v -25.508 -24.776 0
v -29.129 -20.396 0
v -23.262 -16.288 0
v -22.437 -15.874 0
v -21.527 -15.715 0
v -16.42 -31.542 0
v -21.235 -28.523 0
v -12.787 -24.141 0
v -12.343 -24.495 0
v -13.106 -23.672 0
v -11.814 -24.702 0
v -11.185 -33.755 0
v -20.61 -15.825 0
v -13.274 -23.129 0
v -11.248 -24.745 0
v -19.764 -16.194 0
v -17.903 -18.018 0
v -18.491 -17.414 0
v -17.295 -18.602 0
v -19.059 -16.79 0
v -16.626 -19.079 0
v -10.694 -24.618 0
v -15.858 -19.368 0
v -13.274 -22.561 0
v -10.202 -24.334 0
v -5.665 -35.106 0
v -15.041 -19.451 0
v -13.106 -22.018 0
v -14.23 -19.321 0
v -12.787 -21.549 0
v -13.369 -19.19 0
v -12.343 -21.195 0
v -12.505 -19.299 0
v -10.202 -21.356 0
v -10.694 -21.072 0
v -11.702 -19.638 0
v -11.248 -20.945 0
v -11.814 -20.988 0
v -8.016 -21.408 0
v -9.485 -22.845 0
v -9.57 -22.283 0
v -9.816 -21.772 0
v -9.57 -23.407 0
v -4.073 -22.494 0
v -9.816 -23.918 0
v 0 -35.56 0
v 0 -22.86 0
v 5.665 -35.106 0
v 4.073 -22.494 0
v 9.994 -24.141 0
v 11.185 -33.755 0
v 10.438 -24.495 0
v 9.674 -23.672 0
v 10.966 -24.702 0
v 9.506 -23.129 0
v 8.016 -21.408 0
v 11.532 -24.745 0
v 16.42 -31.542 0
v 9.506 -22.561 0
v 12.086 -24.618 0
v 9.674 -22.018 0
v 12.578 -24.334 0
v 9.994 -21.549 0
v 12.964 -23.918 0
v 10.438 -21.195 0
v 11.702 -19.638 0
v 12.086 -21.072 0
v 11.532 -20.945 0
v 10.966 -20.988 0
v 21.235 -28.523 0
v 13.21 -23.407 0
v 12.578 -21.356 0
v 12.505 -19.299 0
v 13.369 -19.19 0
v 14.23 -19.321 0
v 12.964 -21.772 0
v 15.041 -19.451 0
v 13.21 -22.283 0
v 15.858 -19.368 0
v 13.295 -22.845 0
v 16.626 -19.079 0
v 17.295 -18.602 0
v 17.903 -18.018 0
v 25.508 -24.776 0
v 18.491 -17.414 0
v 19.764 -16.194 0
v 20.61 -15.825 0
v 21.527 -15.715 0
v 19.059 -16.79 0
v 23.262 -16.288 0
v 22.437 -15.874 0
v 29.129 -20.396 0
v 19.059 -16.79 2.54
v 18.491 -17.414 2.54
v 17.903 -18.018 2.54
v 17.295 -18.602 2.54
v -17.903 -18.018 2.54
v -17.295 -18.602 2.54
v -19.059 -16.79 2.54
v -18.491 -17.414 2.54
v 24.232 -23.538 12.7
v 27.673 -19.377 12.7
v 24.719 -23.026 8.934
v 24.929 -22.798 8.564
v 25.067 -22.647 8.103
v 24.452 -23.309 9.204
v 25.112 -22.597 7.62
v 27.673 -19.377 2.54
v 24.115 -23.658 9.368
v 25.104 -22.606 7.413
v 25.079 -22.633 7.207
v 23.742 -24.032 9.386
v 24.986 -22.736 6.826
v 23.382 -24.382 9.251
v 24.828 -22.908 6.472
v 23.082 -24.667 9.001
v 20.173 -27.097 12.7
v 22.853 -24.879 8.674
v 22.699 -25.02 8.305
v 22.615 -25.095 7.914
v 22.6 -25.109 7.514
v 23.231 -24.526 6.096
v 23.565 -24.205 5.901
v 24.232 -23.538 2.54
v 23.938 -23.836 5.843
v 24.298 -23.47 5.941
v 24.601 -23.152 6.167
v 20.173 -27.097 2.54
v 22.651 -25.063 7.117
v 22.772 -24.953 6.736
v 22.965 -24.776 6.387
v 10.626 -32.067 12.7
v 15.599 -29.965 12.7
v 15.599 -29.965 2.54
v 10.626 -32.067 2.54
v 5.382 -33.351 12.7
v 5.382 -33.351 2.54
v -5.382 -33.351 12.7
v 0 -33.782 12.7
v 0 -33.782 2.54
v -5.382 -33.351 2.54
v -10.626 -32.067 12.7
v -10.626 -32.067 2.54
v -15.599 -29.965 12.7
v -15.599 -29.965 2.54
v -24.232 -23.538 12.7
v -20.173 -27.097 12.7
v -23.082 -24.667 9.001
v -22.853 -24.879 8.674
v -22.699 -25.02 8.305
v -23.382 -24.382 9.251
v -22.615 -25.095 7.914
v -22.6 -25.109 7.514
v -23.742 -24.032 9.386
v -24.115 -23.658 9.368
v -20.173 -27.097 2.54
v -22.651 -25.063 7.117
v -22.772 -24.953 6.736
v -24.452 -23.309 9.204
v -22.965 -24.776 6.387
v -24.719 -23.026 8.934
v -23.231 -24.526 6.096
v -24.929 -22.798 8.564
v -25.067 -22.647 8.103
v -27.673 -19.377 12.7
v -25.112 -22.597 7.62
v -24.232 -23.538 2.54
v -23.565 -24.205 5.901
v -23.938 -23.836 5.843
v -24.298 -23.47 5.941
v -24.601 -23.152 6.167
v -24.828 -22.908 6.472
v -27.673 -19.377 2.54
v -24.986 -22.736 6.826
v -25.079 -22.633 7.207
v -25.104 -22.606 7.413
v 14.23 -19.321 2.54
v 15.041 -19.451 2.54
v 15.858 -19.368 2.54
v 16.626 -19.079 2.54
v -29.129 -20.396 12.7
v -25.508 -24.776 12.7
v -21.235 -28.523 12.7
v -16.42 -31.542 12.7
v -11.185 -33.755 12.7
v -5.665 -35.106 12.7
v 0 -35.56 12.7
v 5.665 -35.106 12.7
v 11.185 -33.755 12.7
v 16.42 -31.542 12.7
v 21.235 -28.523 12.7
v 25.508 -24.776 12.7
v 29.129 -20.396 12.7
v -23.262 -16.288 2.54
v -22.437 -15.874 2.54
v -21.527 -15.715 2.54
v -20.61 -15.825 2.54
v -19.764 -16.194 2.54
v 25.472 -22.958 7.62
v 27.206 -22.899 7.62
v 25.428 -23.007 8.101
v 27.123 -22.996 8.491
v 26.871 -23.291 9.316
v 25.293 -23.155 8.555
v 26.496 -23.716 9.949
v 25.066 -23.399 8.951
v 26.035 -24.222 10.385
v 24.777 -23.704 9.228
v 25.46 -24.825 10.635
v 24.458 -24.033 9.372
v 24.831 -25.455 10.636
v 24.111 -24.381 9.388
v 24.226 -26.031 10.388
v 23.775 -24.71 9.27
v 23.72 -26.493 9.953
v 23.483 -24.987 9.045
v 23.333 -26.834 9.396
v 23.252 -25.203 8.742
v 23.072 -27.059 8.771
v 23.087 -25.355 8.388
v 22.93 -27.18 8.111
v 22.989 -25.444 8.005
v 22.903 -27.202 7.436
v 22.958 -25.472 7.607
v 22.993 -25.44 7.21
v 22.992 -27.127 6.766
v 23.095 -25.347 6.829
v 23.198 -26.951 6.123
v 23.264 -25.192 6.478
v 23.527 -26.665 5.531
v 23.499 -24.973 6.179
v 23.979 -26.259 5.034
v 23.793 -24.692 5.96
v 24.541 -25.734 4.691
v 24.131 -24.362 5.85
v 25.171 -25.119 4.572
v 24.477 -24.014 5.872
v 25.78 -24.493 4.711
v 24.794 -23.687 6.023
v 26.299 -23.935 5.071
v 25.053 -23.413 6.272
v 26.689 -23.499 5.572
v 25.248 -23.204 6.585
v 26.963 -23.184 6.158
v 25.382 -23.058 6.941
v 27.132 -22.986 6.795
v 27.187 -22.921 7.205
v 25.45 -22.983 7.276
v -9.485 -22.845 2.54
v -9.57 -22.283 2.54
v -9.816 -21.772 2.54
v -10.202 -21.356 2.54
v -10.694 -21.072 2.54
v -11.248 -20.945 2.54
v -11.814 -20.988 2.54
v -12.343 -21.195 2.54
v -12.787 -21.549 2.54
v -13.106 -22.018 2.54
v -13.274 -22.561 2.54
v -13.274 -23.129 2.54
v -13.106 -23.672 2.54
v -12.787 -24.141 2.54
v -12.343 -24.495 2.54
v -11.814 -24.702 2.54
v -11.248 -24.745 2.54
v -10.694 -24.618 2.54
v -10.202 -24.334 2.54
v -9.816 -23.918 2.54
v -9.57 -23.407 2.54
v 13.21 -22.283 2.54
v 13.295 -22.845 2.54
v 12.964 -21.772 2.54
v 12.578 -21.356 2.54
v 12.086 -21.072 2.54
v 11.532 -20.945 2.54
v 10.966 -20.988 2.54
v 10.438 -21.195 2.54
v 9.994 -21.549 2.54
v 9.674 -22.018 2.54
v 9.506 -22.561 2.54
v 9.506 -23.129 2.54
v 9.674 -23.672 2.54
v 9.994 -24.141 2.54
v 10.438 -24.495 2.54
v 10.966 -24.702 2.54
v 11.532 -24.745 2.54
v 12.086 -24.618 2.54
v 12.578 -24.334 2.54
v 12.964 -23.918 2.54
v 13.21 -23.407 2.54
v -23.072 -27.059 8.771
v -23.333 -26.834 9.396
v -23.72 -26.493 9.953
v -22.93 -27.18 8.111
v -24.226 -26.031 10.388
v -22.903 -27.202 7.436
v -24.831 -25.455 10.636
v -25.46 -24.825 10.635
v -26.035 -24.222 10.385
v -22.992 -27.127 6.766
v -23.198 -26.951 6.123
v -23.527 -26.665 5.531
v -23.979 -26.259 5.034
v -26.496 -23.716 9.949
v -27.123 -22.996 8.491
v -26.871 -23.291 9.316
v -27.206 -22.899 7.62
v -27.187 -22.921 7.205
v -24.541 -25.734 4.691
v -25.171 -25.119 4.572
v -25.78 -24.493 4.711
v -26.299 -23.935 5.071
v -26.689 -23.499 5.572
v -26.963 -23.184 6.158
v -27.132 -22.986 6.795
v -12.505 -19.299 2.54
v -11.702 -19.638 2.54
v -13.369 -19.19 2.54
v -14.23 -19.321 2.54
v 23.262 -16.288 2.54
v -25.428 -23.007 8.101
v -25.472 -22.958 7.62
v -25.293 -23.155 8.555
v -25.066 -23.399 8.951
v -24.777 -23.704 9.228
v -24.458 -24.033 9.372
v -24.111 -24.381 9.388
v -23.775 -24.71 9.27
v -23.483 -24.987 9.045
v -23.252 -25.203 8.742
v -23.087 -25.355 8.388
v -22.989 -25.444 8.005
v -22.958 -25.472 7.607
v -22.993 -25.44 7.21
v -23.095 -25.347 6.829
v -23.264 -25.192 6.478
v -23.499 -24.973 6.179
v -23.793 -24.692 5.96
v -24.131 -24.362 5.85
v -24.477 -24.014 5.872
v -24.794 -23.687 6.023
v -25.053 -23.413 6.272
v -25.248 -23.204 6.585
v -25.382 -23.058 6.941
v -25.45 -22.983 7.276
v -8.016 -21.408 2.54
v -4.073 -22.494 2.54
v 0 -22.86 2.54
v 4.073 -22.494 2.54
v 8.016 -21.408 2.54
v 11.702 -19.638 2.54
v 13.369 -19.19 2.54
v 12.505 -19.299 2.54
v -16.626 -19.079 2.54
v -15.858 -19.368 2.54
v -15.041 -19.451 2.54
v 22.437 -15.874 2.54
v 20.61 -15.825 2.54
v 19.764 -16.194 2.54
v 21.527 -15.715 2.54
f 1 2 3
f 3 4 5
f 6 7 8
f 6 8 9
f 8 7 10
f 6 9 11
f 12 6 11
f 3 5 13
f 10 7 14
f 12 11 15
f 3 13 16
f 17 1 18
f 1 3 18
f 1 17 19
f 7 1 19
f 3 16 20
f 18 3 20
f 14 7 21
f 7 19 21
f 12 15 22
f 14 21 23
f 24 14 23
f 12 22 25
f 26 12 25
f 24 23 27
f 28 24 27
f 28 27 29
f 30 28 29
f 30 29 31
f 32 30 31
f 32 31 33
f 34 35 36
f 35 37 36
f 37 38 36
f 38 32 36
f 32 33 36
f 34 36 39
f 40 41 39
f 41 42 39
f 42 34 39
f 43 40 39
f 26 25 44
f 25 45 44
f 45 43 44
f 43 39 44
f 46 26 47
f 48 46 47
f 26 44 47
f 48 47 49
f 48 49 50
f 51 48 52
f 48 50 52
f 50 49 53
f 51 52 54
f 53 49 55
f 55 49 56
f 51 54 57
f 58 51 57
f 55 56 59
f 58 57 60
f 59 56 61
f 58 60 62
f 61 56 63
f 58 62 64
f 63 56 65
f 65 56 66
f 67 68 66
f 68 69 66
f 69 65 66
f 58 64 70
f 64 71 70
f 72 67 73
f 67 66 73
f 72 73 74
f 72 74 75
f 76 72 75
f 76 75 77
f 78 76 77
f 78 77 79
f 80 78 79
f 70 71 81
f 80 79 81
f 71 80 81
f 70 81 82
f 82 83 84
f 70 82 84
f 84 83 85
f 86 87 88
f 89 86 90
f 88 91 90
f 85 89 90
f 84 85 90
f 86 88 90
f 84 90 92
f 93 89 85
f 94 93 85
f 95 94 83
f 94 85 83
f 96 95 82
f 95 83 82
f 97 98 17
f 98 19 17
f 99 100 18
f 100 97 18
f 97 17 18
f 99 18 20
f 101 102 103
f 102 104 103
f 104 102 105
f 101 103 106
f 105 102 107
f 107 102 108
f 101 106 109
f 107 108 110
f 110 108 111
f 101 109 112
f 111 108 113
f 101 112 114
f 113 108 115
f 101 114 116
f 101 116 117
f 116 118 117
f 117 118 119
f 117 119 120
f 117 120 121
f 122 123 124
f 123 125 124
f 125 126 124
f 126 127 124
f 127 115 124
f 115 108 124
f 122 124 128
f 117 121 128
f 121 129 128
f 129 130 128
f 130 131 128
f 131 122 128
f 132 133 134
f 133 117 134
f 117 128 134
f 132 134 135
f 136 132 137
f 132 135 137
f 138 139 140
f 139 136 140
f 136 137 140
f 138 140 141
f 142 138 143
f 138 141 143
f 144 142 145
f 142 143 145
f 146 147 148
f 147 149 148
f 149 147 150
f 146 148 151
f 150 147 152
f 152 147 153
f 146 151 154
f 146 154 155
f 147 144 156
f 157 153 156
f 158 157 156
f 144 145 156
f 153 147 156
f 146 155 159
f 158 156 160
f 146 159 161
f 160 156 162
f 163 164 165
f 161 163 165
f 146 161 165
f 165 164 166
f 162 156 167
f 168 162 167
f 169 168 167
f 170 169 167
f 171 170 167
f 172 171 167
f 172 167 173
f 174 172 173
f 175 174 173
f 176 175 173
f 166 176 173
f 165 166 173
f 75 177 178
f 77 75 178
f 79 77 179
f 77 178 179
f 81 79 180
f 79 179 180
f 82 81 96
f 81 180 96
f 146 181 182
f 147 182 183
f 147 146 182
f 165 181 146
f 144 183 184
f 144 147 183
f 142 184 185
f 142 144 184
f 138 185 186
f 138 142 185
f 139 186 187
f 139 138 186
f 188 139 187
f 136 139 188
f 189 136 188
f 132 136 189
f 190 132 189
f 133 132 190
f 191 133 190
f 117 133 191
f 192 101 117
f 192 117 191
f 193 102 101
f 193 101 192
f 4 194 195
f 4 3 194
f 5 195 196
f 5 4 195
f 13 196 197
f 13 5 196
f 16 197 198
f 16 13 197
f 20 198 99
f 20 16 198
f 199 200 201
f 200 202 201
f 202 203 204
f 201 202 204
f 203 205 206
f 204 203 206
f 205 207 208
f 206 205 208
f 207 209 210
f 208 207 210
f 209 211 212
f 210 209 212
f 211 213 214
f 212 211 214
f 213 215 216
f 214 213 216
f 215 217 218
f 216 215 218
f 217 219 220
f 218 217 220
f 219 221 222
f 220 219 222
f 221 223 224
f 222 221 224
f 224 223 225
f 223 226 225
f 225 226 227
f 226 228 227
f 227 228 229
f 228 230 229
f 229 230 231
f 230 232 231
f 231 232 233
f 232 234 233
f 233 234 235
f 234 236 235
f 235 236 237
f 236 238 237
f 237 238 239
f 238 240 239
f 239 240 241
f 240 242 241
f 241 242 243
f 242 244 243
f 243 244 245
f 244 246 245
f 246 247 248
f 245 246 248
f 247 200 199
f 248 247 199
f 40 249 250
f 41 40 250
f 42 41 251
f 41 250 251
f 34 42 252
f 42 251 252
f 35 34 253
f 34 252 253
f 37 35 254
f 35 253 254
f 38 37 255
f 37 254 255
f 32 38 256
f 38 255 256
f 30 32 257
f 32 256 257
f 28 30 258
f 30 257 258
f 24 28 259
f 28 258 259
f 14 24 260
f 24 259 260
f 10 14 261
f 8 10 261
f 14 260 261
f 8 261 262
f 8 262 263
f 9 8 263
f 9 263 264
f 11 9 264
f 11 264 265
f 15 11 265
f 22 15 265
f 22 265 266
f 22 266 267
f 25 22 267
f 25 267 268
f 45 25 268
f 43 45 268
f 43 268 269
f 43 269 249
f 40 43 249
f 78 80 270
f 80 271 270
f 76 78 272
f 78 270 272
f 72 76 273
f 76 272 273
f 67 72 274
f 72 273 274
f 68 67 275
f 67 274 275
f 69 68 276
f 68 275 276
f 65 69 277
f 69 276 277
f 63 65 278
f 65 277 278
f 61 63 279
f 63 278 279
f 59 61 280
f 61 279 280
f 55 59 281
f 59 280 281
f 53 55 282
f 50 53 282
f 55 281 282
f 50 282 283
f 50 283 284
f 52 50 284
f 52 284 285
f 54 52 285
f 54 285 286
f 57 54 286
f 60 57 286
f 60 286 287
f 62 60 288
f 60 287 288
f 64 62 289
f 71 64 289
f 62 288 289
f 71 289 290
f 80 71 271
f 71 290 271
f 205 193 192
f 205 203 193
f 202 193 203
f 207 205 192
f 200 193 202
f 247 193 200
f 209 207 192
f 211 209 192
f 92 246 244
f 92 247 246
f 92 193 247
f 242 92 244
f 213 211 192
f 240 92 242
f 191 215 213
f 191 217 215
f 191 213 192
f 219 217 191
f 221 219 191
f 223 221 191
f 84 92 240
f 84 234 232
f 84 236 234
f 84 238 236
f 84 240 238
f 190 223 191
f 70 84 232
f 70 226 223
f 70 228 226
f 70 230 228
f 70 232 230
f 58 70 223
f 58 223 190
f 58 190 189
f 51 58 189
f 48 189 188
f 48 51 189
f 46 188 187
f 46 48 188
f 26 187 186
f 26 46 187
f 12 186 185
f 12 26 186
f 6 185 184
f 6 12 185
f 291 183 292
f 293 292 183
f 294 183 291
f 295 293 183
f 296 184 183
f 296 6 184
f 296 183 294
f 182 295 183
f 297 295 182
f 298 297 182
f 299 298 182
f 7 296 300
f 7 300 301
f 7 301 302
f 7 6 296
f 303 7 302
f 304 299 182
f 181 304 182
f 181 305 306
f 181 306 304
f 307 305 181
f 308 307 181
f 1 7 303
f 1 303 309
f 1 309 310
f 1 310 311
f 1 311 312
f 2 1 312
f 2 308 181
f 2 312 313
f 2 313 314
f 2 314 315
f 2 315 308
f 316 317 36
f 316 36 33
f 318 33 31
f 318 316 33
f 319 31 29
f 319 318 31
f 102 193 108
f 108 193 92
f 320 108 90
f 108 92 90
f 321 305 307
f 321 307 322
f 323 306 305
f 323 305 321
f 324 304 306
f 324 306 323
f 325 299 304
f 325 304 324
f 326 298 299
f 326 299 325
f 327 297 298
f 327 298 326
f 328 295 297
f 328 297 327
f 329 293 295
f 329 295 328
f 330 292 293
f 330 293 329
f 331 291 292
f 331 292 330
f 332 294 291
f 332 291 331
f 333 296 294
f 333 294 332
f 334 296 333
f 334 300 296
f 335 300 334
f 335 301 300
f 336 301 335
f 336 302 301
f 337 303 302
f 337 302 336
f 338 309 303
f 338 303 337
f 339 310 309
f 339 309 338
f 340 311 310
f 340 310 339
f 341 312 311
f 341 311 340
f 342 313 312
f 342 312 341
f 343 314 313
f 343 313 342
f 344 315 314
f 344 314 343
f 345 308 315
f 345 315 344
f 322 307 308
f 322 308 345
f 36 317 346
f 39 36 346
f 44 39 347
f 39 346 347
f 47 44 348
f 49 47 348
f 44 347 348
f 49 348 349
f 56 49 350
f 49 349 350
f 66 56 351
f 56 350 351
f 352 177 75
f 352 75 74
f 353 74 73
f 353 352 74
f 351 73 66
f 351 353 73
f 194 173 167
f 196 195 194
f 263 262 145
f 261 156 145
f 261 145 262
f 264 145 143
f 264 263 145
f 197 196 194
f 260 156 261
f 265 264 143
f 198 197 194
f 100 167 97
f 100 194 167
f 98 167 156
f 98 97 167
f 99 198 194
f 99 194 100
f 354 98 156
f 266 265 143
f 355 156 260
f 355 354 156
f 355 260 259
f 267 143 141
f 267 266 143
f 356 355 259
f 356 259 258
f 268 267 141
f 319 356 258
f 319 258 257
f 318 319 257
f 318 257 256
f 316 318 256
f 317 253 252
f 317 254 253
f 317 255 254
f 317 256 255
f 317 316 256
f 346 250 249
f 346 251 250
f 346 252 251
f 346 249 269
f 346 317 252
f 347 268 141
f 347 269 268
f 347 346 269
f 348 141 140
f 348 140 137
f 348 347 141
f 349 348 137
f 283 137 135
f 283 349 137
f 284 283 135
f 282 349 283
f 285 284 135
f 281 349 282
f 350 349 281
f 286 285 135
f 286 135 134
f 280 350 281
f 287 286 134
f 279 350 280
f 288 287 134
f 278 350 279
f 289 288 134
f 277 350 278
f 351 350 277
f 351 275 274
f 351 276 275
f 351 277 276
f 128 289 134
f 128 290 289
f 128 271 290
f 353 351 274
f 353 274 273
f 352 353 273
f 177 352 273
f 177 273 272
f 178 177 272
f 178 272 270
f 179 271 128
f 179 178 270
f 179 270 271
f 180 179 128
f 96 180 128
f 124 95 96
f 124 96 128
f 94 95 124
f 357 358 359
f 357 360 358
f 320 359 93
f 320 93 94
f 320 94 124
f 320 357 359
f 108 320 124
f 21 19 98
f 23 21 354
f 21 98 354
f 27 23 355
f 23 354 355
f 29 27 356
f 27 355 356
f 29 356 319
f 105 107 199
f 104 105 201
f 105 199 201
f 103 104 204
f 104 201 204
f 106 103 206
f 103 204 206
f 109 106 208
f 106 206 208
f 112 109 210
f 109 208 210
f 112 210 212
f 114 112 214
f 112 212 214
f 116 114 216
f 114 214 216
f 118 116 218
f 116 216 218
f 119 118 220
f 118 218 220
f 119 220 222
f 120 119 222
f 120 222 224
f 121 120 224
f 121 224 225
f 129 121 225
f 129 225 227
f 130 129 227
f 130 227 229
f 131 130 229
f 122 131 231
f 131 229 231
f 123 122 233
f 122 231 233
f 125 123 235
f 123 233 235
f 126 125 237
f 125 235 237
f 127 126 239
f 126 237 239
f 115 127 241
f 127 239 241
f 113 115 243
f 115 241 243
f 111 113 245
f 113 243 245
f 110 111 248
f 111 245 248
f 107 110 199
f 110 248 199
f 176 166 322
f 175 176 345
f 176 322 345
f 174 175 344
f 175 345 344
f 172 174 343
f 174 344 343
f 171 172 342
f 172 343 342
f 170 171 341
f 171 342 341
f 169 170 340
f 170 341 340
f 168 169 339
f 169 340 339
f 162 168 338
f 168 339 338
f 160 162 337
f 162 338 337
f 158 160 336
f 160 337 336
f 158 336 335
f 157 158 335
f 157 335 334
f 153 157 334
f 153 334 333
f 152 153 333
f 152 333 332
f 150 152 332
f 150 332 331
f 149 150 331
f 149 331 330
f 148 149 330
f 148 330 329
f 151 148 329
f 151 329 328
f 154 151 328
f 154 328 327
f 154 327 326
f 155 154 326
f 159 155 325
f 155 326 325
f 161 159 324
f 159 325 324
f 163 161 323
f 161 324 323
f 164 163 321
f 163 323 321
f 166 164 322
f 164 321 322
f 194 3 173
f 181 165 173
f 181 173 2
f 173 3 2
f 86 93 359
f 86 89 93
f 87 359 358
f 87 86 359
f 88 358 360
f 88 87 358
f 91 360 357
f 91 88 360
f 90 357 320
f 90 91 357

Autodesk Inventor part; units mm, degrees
ref_plane "XZ Plane" through (0, 0, 0) normal (0, 1, 0) x (-1, 0, 0)
sketch "Sketch1" plane through (0, 0, 0) normal (0, 0, 1) x (1, 0, 0)
  arc A0 (-20.8065, -14.5688) -> (20.8065, -14.5688) centre (0, 0) ccw
  arc A1 (-29.129, -20.3964) -> (29.129, -20.3964) centre (0, 0) ccw
  line L0 (-29.129, -20.3964) -> (-20.8065, -14.5688)
  line L1 (29.129, -20.3964) -> (20.8065, -14.5688)
  line L2 (-20.8065, -14.5688) -> (20.8065, -14.5688) construction
  dimension "d0" = 50.8
  dimension "d2" = 71.12
  dimension "d3" = 110
extrude "Extrusion1" add sketch "Sketch1" along normal blind 2.54
sketch "Sketch2" plane through (0, 0, 2.54) normal (0, 0, 1) x (1, 0, 0)
  arc A0 (-20.8065, -14.5688) -> (20.8065, -14.5688) centre (0, 0) ccw projected
  line L0 (-14.5688, -20.8065) -> (-13.112, -18.7258)
  line L1 (14.5688, -20.8065) -> (13.112, -18.7258)
  arc A1 (-13.112, -18.7258) -> (13.112, -18.7258) centre (0, 0) ccw
  line L2 (-14.5688, -20.8065) -> (14.5688, -20.8065) construction
  dimension "d6" = 2.54
  dimension "d13" = 70
extrude "Extrusion2" add sketch "Sketch2" against normal blind 2.54
sketch "Sketch3" plane through (0, 0, 2.54) normal (0, 0, 1) x (1, 0, 0)
  circle A0 centre (-11.3901, -22.845) radius 1.905
  circle A1 centre (11.3901, -22.845) radius 1.905
  line L0 (-11.3901, -22.845) -> (11.3901, -22.845) construction
  point P0 (0, 0)
  point P1 (0, -22.845)
  dimension "d9" = 3.81
  dimension "d10" = 3.81
  dimension "d11" = 25.527
  dimension "d12" = 26.5
extrude "Extrusion3" cut sketch "Sketch3" against normal through all
sketch "Sketch4" plane through (0, 0, 2.54) normal (0, 0, 1) x (1, 0, 0)
  circle A0 centre (-11.3901, -22.845) radius 1.905 projected
  circle A1 centre (11.3901, -22.845) radius 1.905 projected
  arc A2 (-29.129, -20.3964) -> (29.129, -20.3964) centre (0, 0) ccw projected
  line L0 (29.129, -20.3964) -> (20.8065, -14.5688) projected
  arc A3 (14.5688, -20.8065) -> (20.8065, -14.5688) centre (0, 0) ccw projected
  line L1 (14.5688, -20.8065) -> (13.112, -18.7258) projected
  arc A4 (-13.112, -18.7258) -> (13.112, -18.7258) centre (0, 0) ccw projected
  line L2 (-13.112, -18.7258) -> (-14.5688, -20.8065) projected
  arc A5 (-20.8065, -14.5688) -> (-14.5688, -20.8065) centre (0, 0) ccw projected
  line L3 (-20.8065, -14.5688) -> (-29.129, -20.3964) projected
  line L4 (-20.8065, -14.5688) -> (-29.129, -20.3964) projected
  line L5 (29.129, -20.3964) -> (20.8065, -14.5688) projected
  arc A6 (-27.6726, -19.3766) -> (27.6726, -19.3766) centre (0, 0) ccw
  dimension "d17" = 67.564
extrude "Extrusion4" add sketch "Sketch4" along normal blind 10.16 contours L3 A6 L0 A2
ref_plane "Work Plane2" through (25.1447, -25.1447, 0) normal (0.7071068, -0.7071068, 0) x (0.7071068, 0.7071068, 0)
ref_plane "Work Plane1" through (0, 0, 2.54) normal (0.7071068, -0.7071068, 0) x (0, 0, -1)
ref_plane "Work Plane4" through (-25.1447, -25.1447, 0) normal (0.7071068, 0.7071068, 0) x (-0.7071068, 0.7071068, 0)
ref_plane "Work Plane3" through (0, 0, 2.54) normal (0.7071068, 0.7071068, 0) x (0, 0, -1)
sketch "Sketch5" plane through (-25.1447, -25.1447, 0) normal (0.7071068, 0.7071068, 0) x (-0.7071068, 0.7071068, 0)
  circle A0 centre (0, 7.62) radius 1.778
  line L0 (5.8662, 2.54) -> (5.8662, 12.7) projected
  point P0 (0, 0)
  point P1 (6.1749, 4.826)
  point P2 (5.8662, 7.62)
  dimension "d22" = 3.556
extrude "Extrusion5" cut sketch "Sketch5" along normal blind 7.112
sketch "Sketch6" plane through (25.1447, -25.1447, 0) normal (0.7071068, -0.7071068, 0) x (0.7071068, 0.7071068, 0)
  circle A0 centre (0, 7.62) radius 1.778
  line L0 (5.8662, 2.54) -> (5.8662, 12.7) projected
  point P0 (0, 0)
  point P1 (6.1749, 4.826)
  point P2 (5.8662, 7.62)
  dimension "d25" = 3.556
extrude "Extrusion6" cut sketch "Sketch6" against normal blind 7.112
fillet "Fillet1" radius 3.175 6 edges at (-20.8065, -14.5688, 1.27) (-14.5688, -20.8065, 1.27) (-13.112, -18.7258, 1.27) (13.112, -18.7258, 1.27) (14.5688, -20.8065, 1.27) (20.8065, -14.5688, 1.27)
chamfer "Chamfer1" distance 1.27 angle 45 2 edges at (-23.856, -26.3705, 7.6201) (23.856, -26.3705, 7.6201)
properties part number "BearingMountBrace" material "ABS Plastic"
